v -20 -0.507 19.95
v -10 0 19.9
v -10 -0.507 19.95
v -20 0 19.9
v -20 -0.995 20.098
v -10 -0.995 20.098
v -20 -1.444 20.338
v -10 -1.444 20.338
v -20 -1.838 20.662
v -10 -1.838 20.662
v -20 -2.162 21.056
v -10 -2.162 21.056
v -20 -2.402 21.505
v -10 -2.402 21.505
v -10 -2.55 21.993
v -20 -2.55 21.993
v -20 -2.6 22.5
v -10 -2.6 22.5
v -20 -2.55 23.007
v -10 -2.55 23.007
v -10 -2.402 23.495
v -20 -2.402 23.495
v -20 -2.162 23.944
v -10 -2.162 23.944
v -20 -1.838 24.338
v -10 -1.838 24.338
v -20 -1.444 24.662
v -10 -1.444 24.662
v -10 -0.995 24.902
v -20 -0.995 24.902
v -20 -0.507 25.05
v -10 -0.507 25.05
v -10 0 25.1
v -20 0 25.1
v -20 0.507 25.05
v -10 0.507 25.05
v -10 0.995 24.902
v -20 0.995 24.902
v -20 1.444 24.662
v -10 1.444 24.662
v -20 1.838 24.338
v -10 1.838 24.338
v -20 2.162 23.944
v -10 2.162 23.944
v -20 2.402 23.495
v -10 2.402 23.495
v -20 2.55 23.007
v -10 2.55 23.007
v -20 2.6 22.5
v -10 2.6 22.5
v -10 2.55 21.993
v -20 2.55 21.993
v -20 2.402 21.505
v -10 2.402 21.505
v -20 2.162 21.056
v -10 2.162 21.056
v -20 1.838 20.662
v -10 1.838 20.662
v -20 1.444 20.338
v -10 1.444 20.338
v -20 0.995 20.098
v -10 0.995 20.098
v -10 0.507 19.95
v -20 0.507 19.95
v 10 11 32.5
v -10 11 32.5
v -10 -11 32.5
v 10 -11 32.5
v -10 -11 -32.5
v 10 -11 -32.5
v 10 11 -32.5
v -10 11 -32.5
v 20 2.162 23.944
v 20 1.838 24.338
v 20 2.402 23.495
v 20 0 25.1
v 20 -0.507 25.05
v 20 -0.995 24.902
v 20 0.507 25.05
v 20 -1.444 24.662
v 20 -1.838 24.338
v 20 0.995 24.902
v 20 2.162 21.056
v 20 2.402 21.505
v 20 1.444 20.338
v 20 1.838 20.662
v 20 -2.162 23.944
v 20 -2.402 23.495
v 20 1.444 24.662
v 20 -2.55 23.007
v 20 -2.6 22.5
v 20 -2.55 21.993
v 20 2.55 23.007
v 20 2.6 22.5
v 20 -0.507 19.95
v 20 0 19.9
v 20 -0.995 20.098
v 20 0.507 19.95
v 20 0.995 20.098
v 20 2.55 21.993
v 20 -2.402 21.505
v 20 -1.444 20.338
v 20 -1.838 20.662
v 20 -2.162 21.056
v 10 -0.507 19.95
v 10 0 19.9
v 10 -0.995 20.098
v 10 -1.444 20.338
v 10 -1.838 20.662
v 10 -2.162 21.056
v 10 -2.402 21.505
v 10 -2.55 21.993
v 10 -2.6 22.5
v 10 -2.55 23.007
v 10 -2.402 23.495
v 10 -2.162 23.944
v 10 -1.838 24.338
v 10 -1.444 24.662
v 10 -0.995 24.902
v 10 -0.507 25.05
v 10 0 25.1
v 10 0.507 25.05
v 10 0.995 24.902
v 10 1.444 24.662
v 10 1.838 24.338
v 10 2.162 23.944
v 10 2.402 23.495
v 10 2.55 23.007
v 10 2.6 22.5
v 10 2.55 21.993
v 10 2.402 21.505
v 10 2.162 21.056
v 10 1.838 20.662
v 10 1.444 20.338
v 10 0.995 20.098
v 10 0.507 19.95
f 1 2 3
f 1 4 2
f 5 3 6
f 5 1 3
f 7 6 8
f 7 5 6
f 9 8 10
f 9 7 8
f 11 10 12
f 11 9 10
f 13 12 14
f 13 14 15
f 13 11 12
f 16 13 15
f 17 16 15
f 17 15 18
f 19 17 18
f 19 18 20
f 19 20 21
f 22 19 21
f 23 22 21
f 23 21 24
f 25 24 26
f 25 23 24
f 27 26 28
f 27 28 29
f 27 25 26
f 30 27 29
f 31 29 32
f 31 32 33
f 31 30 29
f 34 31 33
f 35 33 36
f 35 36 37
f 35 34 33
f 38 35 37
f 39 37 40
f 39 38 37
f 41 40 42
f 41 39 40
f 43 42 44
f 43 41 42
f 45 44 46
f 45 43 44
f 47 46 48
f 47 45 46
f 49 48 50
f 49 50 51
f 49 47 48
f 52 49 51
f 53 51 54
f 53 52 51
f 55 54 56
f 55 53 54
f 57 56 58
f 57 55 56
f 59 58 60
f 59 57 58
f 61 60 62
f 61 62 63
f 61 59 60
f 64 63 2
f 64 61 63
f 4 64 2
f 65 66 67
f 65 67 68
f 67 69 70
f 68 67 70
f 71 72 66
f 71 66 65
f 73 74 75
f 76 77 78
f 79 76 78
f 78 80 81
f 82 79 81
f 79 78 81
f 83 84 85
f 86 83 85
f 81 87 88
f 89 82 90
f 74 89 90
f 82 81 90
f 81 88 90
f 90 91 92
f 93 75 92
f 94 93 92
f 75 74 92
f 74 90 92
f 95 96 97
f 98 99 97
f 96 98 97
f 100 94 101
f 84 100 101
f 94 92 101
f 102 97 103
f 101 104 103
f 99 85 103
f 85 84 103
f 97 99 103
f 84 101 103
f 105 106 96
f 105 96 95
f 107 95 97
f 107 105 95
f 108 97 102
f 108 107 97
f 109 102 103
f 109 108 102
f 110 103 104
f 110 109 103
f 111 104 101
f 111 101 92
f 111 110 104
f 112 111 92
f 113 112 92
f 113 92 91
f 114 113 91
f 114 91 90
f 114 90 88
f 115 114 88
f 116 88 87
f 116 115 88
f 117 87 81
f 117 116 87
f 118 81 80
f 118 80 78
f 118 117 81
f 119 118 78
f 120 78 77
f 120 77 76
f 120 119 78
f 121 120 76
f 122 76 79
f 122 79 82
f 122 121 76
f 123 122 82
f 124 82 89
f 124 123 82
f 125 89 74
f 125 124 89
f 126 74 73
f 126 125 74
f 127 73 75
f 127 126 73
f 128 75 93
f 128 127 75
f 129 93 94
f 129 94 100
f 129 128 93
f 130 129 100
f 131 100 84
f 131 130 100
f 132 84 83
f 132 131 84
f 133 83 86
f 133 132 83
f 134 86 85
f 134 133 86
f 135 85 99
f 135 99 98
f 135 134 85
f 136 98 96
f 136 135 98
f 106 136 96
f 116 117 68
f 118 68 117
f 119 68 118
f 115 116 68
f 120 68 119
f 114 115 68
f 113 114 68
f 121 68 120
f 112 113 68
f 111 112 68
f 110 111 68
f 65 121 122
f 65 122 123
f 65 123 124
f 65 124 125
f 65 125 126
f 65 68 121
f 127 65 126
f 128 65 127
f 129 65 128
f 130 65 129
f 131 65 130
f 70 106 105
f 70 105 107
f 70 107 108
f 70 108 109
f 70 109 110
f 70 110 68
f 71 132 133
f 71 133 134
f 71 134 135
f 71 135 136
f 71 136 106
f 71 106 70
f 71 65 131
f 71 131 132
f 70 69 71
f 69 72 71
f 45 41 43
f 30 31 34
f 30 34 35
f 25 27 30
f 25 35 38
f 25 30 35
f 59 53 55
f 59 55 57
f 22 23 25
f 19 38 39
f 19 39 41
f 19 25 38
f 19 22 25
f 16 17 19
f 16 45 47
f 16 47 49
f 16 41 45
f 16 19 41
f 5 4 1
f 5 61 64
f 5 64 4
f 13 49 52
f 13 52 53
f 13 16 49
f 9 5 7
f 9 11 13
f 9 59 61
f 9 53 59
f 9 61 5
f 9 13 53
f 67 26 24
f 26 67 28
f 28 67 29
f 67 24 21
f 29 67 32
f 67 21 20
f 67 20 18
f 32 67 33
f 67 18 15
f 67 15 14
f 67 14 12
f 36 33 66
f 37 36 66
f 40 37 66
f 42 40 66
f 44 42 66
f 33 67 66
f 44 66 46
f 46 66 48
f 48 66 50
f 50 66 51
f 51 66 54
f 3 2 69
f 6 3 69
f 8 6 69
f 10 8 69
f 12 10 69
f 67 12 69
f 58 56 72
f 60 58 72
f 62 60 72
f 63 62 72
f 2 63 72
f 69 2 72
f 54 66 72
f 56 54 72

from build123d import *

# Parameters (mm, degrees)
CROQUIS1_W              = 20
CROQUIS1_H              = 65
SALIENTE_EXTRUIR1_DEPTH = 11
CROQUIS3_R              = 2.6
SALIENTE_EXTRUIR2_DEPTH = 20


with BuildPart() as part:
    # Croquis1 → Saliente-Extruir1 (new, symmetric)
    with BuildSketch(Plane(origin=(0, 0, 0), x_dir=(1, 0, 0), z_dir=(0, 1, 0))):
        Rectangle(CROQUIS1_W, CROQUIS1_H)
    extrude(amount=SALIENTE_EXTRUIR1_DEPTH, both=True)

    # Croquis3 → Saliente-Extruir2 (add, symmetric)
    with BuildSketch(Plane.ZY):
        with Locations(Location((22.5, 0, 0), (0, 0, 180))):
            Circle(CROQUIS3_R)
    extrude(amount=SALIENTE_EXTRUIR2_DEPTH, both=True)


solid = part.part
